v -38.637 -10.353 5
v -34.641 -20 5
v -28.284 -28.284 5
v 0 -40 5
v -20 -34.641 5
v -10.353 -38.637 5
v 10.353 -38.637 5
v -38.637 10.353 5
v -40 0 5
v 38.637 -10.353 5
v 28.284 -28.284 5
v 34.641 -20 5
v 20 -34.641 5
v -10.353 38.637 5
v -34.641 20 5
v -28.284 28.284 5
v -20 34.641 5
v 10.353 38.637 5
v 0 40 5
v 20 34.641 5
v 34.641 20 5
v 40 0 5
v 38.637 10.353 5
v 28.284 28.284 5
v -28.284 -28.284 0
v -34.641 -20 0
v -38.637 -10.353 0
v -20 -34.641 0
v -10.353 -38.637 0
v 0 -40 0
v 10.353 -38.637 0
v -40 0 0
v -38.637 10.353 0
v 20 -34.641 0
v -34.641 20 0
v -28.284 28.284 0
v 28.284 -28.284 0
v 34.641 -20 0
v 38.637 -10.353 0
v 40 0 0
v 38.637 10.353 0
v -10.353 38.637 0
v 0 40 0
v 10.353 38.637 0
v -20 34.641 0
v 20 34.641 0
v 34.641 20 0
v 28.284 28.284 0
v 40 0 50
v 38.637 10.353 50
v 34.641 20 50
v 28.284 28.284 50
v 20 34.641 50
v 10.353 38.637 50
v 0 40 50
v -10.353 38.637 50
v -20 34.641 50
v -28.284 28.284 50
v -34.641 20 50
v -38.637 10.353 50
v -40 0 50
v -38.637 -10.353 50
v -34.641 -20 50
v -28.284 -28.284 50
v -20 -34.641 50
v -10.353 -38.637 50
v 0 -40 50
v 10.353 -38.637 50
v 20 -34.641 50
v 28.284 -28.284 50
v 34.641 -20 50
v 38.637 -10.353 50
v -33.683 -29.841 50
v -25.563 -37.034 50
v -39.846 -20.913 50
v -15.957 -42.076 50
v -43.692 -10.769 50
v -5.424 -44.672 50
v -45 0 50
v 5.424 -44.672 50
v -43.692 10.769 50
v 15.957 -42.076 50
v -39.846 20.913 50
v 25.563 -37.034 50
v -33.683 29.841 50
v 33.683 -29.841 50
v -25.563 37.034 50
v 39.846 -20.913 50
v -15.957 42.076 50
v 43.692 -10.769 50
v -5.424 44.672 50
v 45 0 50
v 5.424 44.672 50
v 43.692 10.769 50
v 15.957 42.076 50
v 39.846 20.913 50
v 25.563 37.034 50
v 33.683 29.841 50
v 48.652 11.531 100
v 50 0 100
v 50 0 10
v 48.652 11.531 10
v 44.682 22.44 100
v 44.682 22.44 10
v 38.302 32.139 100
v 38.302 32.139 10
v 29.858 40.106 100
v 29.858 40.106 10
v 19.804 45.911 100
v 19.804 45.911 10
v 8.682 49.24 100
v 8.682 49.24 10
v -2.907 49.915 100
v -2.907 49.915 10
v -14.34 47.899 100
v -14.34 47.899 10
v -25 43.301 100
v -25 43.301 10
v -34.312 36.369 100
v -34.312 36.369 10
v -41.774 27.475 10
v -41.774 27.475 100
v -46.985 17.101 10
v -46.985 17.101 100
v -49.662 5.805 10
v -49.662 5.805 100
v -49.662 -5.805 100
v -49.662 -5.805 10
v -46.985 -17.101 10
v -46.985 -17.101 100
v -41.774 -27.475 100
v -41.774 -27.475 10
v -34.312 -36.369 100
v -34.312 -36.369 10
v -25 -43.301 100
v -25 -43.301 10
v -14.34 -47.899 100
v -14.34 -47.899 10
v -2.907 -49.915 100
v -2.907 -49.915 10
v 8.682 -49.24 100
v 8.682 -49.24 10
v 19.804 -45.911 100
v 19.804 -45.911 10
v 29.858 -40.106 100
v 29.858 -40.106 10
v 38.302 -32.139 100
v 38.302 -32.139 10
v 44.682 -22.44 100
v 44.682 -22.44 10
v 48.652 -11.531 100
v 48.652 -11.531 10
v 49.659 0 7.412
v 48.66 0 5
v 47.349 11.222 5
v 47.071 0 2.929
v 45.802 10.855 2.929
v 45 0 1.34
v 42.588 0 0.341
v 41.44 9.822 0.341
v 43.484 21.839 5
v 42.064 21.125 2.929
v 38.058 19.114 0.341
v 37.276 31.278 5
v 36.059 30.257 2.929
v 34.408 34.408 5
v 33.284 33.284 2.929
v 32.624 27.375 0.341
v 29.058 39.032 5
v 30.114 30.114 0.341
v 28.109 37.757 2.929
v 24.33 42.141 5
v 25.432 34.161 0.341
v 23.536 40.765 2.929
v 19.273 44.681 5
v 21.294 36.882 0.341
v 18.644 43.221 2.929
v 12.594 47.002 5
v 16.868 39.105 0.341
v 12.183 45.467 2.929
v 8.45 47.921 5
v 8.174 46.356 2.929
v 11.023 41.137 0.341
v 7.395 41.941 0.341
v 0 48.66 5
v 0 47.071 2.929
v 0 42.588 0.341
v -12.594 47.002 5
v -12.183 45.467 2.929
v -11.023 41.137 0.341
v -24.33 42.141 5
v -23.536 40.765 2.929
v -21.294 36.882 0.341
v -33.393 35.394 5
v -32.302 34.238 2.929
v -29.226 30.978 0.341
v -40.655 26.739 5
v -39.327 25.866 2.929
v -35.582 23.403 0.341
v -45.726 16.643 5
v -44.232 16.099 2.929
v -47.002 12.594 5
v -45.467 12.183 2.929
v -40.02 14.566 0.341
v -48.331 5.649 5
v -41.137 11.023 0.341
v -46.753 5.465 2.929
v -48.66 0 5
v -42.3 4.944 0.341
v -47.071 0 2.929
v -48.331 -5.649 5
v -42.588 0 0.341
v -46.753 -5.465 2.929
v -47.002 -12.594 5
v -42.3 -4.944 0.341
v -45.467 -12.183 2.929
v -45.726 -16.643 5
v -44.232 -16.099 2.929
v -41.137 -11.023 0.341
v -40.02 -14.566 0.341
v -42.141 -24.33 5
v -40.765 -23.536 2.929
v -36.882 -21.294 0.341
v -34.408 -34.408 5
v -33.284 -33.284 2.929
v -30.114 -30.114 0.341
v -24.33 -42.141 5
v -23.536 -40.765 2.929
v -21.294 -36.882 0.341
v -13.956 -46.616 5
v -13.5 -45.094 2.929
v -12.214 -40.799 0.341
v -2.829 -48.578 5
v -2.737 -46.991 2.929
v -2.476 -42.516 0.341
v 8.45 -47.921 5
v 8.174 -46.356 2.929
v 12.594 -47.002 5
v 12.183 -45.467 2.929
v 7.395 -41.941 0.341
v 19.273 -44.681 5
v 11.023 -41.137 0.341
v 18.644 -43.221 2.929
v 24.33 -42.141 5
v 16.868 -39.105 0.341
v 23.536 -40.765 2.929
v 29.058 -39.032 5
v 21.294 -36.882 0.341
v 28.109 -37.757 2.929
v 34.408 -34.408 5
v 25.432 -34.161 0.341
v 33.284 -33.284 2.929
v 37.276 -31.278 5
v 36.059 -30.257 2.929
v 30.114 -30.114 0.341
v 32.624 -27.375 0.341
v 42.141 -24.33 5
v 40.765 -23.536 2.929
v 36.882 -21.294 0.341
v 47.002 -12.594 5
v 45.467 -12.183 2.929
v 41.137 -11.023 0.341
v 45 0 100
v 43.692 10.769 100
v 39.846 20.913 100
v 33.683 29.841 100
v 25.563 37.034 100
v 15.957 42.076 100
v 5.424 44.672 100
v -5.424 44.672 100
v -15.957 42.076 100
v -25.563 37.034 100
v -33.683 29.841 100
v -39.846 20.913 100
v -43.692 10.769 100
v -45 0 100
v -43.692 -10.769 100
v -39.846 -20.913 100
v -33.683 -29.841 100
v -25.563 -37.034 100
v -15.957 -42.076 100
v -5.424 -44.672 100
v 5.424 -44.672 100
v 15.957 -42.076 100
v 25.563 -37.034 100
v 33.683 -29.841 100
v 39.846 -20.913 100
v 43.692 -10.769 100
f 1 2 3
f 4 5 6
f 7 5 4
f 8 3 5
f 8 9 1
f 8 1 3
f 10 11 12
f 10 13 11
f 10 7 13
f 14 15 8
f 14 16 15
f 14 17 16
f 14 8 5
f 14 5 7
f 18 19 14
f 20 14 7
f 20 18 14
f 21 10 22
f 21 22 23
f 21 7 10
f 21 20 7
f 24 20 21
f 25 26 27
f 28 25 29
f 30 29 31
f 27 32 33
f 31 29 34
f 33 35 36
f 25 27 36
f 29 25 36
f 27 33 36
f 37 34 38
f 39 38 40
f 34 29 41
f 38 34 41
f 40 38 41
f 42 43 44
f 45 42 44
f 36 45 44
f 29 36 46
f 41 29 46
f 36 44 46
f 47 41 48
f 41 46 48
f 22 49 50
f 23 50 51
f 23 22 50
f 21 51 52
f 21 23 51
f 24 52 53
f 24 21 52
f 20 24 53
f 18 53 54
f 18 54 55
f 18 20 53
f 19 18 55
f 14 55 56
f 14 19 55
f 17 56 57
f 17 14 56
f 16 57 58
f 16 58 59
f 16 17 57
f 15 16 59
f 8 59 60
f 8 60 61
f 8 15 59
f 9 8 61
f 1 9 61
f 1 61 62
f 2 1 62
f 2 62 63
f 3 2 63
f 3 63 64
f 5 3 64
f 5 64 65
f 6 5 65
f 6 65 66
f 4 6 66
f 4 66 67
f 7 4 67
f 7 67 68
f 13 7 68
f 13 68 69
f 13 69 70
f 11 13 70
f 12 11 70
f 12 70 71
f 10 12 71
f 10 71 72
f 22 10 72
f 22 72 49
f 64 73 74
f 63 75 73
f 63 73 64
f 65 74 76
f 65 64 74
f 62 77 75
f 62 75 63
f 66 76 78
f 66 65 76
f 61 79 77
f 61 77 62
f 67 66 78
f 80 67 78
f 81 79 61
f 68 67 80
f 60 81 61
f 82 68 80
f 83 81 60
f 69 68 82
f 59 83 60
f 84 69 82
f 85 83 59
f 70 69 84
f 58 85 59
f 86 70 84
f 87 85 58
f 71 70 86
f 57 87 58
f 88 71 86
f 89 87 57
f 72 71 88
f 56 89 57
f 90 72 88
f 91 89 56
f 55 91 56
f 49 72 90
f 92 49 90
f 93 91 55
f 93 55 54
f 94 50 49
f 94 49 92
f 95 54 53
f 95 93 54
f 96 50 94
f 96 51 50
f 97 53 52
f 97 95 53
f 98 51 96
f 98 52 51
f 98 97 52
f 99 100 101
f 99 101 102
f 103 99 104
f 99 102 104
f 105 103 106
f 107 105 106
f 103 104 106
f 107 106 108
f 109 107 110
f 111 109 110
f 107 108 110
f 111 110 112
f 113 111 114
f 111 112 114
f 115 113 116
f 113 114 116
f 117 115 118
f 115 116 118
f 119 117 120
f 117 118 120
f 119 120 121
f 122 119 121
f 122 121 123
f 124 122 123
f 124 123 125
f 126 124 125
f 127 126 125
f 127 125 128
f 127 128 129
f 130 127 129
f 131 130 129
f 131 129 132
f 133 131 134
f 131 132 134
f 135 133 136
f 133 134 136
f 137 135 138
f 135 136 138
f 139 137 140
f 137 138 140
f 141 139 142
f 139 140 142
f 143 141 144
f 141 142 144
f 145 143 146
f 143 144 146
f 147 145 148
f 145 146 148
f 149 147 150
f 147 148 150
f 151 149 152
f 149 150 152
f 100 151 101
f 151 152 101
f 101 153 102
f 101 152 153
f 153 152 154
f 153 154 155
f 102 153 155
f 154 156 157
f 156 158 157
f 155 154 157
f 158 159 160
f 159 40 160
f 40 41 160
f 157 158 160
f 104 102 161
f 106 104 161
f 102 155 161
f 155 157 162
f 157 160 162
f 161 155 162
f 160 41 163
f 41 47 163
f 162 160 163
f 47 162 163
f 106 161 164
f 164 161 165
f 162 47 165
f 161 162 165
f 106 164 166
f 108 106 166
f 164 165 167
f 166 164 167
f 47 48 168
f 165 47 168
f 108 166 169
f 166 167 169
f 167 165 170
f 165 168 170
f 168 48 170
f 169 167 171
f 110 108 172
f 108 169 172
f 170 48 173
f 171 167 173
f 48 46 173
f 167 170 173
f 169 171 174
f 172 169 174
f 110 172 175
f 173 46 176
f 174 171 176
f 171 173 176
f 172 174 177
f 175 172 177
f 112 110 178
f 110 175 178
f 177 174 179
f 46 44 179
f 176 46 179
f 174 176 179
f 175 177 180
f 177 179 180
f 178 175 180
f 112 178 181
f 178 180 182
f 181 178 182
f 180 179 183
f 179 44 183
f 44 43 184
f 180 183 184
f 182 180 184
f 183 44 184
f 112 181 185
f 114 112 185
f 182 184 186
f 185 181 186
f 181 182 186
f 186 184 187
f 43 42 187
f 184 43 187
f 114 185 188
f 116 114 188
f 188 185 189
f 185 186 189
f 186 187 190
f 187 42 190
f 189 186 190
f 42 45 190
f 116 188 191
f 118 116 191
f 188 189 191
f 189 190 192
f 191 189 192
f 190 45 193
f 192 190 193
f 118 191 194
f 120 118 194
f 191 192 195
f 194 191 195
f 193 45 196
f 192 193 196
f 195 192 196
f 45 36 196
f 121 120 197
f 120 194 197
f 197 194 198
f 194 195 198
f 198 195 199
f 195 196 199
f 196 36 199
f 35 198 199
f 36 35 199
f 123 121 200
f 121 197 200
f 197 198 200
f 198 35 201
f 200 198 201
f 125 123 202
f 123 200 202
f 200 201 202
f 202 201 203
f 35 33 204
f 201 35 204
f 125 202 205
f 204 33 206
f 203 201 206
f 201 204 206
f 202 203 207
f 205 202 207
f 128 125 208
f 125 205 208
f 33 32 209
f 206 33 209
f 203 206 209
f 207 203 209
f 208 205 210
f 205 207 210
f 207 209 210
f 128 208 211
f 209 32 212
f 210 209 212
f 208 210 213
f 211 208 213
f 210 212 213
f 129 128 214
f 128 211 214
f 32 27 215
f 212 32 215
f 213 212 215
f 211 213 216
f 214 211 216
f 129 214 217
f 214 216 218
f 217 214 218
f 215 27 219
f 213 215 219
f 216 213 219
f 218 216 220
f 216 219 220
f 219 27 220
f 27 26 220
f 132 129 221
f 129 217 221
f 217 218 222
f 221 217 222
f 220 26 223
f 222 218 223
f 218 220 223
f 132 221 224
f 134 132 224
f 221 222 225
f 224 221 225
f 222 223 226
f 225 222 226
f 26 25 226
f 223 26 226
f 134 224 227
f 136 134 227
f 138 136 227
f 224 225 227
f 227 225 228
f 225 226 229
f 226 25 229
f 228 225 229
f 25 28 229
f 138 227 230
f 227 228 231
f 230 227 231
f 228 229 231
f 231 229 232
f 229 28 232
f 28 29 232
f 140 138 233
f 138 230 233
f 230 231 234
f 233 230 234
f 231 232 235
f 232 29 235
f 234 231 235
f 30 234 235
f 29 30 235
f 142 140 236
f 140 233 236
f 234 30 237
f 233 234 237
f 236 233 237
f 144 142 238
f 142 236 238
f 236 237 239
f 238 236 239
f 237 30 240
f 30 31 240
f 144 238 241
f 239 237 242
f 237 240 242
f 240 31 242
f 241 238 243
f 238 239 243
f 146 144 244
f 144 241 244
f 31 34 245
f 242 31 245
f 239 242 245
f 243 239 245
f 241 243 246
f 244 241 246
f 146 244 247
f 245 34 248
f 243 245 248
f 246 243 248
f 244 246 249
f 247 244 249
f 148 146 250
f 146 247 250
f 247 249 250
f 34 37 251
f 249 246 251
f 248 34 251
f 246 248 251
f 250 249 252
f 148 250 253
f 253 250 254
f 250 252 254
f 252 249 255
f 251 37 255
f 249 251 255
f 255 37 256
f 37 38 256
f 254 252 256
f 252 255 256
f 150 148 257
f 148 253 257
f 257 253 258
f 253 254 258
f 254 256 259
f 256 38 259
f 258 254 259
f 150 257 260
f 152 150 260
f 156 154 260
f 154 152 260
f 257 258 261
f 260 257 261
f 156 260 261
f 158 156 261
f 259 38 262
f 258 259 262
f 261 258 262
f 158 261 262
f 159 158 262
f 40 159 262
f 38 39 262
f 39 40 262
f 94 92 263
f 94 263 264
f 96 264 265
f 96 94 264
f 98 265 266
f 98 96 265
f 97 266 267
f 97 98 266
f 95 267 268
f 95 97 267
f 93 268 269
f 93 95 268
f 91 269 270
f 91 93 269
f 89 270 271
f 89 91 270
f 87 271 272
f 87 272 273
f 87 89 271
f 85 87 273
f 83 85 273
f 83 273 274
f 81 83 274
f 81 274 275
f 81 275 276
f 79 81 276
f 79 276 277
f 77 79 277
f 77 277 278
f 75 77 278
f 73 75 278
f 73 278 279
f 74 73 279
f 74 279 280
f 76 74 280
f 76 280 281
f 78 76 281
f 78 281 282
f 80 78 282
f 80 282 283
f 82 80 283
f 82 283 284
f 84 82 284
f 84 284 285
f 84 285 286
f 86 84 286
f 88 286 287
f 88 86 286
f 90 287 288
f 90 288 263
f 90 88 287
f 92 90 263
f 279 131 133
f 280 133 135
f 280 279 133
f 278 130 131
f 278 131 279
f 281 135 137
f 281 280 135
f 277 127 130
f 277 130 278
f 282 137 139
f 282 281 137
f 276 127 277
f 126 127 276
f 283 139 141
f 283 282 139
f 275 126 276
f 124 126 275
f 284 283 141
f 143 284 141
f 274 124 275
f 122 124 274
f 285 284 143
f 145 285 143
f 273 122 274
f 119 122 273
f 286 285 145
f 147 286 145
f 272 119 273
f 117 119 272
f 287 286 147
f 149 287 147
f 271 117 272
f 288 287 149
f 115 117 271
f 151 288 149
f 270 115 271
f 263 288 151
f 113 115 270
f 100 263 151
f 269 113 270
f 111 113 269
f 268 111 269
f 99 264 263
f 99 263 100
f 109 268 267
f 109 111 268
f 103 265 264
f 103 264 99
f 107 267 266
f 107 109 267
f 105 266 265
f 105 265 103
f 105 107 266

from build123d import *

# Parameters (mm, degrees)
F0_R     = 45
F0_R_2   = 40
F1_DEPTH = 50
F0_R_3   = 50
F2_DEPTH = 100
F3_DEPTH = 5
F4_R     = 10


with BuildPart() as f1:
    # F0 (on Top) → F1 (new body)
    with BuildSketch(Plane.XY):
        Circle(F0_R)
        Circle(F0_R_2, mode=Mode.SUBTRACT)
    extrude(amount=F1_DEPTH)

    # F0 (on Top) → F2 (join)
    with BuildSketch(Plane.XY):
        Circle(F0_R_3)
        Circle(F0_R, mode=Mode.SUBTRACT)
    extrude(amount=F2_DEPTH)

    # F0 (on Top) → F3 (join)
    with BuildSketch(Plane.XY):
        Circle(F0_R_3)
        Circle(F0_R, mode=Mode.SUBTRACT)
        Circle(F0_R)
        Circle(F0_R_2, mode=Mode.SUBTRACT)
        Circle(F0_R_2)
    extrude(amount=F3_DEPTH)

    # F4
    f4_edges = [f1.edges().sort_by_distance(p)[0] for p in [
        (-50, 0, 0),
    ]]
    fillet(f4_edges, radius=F4_R)


solid = f1.part
